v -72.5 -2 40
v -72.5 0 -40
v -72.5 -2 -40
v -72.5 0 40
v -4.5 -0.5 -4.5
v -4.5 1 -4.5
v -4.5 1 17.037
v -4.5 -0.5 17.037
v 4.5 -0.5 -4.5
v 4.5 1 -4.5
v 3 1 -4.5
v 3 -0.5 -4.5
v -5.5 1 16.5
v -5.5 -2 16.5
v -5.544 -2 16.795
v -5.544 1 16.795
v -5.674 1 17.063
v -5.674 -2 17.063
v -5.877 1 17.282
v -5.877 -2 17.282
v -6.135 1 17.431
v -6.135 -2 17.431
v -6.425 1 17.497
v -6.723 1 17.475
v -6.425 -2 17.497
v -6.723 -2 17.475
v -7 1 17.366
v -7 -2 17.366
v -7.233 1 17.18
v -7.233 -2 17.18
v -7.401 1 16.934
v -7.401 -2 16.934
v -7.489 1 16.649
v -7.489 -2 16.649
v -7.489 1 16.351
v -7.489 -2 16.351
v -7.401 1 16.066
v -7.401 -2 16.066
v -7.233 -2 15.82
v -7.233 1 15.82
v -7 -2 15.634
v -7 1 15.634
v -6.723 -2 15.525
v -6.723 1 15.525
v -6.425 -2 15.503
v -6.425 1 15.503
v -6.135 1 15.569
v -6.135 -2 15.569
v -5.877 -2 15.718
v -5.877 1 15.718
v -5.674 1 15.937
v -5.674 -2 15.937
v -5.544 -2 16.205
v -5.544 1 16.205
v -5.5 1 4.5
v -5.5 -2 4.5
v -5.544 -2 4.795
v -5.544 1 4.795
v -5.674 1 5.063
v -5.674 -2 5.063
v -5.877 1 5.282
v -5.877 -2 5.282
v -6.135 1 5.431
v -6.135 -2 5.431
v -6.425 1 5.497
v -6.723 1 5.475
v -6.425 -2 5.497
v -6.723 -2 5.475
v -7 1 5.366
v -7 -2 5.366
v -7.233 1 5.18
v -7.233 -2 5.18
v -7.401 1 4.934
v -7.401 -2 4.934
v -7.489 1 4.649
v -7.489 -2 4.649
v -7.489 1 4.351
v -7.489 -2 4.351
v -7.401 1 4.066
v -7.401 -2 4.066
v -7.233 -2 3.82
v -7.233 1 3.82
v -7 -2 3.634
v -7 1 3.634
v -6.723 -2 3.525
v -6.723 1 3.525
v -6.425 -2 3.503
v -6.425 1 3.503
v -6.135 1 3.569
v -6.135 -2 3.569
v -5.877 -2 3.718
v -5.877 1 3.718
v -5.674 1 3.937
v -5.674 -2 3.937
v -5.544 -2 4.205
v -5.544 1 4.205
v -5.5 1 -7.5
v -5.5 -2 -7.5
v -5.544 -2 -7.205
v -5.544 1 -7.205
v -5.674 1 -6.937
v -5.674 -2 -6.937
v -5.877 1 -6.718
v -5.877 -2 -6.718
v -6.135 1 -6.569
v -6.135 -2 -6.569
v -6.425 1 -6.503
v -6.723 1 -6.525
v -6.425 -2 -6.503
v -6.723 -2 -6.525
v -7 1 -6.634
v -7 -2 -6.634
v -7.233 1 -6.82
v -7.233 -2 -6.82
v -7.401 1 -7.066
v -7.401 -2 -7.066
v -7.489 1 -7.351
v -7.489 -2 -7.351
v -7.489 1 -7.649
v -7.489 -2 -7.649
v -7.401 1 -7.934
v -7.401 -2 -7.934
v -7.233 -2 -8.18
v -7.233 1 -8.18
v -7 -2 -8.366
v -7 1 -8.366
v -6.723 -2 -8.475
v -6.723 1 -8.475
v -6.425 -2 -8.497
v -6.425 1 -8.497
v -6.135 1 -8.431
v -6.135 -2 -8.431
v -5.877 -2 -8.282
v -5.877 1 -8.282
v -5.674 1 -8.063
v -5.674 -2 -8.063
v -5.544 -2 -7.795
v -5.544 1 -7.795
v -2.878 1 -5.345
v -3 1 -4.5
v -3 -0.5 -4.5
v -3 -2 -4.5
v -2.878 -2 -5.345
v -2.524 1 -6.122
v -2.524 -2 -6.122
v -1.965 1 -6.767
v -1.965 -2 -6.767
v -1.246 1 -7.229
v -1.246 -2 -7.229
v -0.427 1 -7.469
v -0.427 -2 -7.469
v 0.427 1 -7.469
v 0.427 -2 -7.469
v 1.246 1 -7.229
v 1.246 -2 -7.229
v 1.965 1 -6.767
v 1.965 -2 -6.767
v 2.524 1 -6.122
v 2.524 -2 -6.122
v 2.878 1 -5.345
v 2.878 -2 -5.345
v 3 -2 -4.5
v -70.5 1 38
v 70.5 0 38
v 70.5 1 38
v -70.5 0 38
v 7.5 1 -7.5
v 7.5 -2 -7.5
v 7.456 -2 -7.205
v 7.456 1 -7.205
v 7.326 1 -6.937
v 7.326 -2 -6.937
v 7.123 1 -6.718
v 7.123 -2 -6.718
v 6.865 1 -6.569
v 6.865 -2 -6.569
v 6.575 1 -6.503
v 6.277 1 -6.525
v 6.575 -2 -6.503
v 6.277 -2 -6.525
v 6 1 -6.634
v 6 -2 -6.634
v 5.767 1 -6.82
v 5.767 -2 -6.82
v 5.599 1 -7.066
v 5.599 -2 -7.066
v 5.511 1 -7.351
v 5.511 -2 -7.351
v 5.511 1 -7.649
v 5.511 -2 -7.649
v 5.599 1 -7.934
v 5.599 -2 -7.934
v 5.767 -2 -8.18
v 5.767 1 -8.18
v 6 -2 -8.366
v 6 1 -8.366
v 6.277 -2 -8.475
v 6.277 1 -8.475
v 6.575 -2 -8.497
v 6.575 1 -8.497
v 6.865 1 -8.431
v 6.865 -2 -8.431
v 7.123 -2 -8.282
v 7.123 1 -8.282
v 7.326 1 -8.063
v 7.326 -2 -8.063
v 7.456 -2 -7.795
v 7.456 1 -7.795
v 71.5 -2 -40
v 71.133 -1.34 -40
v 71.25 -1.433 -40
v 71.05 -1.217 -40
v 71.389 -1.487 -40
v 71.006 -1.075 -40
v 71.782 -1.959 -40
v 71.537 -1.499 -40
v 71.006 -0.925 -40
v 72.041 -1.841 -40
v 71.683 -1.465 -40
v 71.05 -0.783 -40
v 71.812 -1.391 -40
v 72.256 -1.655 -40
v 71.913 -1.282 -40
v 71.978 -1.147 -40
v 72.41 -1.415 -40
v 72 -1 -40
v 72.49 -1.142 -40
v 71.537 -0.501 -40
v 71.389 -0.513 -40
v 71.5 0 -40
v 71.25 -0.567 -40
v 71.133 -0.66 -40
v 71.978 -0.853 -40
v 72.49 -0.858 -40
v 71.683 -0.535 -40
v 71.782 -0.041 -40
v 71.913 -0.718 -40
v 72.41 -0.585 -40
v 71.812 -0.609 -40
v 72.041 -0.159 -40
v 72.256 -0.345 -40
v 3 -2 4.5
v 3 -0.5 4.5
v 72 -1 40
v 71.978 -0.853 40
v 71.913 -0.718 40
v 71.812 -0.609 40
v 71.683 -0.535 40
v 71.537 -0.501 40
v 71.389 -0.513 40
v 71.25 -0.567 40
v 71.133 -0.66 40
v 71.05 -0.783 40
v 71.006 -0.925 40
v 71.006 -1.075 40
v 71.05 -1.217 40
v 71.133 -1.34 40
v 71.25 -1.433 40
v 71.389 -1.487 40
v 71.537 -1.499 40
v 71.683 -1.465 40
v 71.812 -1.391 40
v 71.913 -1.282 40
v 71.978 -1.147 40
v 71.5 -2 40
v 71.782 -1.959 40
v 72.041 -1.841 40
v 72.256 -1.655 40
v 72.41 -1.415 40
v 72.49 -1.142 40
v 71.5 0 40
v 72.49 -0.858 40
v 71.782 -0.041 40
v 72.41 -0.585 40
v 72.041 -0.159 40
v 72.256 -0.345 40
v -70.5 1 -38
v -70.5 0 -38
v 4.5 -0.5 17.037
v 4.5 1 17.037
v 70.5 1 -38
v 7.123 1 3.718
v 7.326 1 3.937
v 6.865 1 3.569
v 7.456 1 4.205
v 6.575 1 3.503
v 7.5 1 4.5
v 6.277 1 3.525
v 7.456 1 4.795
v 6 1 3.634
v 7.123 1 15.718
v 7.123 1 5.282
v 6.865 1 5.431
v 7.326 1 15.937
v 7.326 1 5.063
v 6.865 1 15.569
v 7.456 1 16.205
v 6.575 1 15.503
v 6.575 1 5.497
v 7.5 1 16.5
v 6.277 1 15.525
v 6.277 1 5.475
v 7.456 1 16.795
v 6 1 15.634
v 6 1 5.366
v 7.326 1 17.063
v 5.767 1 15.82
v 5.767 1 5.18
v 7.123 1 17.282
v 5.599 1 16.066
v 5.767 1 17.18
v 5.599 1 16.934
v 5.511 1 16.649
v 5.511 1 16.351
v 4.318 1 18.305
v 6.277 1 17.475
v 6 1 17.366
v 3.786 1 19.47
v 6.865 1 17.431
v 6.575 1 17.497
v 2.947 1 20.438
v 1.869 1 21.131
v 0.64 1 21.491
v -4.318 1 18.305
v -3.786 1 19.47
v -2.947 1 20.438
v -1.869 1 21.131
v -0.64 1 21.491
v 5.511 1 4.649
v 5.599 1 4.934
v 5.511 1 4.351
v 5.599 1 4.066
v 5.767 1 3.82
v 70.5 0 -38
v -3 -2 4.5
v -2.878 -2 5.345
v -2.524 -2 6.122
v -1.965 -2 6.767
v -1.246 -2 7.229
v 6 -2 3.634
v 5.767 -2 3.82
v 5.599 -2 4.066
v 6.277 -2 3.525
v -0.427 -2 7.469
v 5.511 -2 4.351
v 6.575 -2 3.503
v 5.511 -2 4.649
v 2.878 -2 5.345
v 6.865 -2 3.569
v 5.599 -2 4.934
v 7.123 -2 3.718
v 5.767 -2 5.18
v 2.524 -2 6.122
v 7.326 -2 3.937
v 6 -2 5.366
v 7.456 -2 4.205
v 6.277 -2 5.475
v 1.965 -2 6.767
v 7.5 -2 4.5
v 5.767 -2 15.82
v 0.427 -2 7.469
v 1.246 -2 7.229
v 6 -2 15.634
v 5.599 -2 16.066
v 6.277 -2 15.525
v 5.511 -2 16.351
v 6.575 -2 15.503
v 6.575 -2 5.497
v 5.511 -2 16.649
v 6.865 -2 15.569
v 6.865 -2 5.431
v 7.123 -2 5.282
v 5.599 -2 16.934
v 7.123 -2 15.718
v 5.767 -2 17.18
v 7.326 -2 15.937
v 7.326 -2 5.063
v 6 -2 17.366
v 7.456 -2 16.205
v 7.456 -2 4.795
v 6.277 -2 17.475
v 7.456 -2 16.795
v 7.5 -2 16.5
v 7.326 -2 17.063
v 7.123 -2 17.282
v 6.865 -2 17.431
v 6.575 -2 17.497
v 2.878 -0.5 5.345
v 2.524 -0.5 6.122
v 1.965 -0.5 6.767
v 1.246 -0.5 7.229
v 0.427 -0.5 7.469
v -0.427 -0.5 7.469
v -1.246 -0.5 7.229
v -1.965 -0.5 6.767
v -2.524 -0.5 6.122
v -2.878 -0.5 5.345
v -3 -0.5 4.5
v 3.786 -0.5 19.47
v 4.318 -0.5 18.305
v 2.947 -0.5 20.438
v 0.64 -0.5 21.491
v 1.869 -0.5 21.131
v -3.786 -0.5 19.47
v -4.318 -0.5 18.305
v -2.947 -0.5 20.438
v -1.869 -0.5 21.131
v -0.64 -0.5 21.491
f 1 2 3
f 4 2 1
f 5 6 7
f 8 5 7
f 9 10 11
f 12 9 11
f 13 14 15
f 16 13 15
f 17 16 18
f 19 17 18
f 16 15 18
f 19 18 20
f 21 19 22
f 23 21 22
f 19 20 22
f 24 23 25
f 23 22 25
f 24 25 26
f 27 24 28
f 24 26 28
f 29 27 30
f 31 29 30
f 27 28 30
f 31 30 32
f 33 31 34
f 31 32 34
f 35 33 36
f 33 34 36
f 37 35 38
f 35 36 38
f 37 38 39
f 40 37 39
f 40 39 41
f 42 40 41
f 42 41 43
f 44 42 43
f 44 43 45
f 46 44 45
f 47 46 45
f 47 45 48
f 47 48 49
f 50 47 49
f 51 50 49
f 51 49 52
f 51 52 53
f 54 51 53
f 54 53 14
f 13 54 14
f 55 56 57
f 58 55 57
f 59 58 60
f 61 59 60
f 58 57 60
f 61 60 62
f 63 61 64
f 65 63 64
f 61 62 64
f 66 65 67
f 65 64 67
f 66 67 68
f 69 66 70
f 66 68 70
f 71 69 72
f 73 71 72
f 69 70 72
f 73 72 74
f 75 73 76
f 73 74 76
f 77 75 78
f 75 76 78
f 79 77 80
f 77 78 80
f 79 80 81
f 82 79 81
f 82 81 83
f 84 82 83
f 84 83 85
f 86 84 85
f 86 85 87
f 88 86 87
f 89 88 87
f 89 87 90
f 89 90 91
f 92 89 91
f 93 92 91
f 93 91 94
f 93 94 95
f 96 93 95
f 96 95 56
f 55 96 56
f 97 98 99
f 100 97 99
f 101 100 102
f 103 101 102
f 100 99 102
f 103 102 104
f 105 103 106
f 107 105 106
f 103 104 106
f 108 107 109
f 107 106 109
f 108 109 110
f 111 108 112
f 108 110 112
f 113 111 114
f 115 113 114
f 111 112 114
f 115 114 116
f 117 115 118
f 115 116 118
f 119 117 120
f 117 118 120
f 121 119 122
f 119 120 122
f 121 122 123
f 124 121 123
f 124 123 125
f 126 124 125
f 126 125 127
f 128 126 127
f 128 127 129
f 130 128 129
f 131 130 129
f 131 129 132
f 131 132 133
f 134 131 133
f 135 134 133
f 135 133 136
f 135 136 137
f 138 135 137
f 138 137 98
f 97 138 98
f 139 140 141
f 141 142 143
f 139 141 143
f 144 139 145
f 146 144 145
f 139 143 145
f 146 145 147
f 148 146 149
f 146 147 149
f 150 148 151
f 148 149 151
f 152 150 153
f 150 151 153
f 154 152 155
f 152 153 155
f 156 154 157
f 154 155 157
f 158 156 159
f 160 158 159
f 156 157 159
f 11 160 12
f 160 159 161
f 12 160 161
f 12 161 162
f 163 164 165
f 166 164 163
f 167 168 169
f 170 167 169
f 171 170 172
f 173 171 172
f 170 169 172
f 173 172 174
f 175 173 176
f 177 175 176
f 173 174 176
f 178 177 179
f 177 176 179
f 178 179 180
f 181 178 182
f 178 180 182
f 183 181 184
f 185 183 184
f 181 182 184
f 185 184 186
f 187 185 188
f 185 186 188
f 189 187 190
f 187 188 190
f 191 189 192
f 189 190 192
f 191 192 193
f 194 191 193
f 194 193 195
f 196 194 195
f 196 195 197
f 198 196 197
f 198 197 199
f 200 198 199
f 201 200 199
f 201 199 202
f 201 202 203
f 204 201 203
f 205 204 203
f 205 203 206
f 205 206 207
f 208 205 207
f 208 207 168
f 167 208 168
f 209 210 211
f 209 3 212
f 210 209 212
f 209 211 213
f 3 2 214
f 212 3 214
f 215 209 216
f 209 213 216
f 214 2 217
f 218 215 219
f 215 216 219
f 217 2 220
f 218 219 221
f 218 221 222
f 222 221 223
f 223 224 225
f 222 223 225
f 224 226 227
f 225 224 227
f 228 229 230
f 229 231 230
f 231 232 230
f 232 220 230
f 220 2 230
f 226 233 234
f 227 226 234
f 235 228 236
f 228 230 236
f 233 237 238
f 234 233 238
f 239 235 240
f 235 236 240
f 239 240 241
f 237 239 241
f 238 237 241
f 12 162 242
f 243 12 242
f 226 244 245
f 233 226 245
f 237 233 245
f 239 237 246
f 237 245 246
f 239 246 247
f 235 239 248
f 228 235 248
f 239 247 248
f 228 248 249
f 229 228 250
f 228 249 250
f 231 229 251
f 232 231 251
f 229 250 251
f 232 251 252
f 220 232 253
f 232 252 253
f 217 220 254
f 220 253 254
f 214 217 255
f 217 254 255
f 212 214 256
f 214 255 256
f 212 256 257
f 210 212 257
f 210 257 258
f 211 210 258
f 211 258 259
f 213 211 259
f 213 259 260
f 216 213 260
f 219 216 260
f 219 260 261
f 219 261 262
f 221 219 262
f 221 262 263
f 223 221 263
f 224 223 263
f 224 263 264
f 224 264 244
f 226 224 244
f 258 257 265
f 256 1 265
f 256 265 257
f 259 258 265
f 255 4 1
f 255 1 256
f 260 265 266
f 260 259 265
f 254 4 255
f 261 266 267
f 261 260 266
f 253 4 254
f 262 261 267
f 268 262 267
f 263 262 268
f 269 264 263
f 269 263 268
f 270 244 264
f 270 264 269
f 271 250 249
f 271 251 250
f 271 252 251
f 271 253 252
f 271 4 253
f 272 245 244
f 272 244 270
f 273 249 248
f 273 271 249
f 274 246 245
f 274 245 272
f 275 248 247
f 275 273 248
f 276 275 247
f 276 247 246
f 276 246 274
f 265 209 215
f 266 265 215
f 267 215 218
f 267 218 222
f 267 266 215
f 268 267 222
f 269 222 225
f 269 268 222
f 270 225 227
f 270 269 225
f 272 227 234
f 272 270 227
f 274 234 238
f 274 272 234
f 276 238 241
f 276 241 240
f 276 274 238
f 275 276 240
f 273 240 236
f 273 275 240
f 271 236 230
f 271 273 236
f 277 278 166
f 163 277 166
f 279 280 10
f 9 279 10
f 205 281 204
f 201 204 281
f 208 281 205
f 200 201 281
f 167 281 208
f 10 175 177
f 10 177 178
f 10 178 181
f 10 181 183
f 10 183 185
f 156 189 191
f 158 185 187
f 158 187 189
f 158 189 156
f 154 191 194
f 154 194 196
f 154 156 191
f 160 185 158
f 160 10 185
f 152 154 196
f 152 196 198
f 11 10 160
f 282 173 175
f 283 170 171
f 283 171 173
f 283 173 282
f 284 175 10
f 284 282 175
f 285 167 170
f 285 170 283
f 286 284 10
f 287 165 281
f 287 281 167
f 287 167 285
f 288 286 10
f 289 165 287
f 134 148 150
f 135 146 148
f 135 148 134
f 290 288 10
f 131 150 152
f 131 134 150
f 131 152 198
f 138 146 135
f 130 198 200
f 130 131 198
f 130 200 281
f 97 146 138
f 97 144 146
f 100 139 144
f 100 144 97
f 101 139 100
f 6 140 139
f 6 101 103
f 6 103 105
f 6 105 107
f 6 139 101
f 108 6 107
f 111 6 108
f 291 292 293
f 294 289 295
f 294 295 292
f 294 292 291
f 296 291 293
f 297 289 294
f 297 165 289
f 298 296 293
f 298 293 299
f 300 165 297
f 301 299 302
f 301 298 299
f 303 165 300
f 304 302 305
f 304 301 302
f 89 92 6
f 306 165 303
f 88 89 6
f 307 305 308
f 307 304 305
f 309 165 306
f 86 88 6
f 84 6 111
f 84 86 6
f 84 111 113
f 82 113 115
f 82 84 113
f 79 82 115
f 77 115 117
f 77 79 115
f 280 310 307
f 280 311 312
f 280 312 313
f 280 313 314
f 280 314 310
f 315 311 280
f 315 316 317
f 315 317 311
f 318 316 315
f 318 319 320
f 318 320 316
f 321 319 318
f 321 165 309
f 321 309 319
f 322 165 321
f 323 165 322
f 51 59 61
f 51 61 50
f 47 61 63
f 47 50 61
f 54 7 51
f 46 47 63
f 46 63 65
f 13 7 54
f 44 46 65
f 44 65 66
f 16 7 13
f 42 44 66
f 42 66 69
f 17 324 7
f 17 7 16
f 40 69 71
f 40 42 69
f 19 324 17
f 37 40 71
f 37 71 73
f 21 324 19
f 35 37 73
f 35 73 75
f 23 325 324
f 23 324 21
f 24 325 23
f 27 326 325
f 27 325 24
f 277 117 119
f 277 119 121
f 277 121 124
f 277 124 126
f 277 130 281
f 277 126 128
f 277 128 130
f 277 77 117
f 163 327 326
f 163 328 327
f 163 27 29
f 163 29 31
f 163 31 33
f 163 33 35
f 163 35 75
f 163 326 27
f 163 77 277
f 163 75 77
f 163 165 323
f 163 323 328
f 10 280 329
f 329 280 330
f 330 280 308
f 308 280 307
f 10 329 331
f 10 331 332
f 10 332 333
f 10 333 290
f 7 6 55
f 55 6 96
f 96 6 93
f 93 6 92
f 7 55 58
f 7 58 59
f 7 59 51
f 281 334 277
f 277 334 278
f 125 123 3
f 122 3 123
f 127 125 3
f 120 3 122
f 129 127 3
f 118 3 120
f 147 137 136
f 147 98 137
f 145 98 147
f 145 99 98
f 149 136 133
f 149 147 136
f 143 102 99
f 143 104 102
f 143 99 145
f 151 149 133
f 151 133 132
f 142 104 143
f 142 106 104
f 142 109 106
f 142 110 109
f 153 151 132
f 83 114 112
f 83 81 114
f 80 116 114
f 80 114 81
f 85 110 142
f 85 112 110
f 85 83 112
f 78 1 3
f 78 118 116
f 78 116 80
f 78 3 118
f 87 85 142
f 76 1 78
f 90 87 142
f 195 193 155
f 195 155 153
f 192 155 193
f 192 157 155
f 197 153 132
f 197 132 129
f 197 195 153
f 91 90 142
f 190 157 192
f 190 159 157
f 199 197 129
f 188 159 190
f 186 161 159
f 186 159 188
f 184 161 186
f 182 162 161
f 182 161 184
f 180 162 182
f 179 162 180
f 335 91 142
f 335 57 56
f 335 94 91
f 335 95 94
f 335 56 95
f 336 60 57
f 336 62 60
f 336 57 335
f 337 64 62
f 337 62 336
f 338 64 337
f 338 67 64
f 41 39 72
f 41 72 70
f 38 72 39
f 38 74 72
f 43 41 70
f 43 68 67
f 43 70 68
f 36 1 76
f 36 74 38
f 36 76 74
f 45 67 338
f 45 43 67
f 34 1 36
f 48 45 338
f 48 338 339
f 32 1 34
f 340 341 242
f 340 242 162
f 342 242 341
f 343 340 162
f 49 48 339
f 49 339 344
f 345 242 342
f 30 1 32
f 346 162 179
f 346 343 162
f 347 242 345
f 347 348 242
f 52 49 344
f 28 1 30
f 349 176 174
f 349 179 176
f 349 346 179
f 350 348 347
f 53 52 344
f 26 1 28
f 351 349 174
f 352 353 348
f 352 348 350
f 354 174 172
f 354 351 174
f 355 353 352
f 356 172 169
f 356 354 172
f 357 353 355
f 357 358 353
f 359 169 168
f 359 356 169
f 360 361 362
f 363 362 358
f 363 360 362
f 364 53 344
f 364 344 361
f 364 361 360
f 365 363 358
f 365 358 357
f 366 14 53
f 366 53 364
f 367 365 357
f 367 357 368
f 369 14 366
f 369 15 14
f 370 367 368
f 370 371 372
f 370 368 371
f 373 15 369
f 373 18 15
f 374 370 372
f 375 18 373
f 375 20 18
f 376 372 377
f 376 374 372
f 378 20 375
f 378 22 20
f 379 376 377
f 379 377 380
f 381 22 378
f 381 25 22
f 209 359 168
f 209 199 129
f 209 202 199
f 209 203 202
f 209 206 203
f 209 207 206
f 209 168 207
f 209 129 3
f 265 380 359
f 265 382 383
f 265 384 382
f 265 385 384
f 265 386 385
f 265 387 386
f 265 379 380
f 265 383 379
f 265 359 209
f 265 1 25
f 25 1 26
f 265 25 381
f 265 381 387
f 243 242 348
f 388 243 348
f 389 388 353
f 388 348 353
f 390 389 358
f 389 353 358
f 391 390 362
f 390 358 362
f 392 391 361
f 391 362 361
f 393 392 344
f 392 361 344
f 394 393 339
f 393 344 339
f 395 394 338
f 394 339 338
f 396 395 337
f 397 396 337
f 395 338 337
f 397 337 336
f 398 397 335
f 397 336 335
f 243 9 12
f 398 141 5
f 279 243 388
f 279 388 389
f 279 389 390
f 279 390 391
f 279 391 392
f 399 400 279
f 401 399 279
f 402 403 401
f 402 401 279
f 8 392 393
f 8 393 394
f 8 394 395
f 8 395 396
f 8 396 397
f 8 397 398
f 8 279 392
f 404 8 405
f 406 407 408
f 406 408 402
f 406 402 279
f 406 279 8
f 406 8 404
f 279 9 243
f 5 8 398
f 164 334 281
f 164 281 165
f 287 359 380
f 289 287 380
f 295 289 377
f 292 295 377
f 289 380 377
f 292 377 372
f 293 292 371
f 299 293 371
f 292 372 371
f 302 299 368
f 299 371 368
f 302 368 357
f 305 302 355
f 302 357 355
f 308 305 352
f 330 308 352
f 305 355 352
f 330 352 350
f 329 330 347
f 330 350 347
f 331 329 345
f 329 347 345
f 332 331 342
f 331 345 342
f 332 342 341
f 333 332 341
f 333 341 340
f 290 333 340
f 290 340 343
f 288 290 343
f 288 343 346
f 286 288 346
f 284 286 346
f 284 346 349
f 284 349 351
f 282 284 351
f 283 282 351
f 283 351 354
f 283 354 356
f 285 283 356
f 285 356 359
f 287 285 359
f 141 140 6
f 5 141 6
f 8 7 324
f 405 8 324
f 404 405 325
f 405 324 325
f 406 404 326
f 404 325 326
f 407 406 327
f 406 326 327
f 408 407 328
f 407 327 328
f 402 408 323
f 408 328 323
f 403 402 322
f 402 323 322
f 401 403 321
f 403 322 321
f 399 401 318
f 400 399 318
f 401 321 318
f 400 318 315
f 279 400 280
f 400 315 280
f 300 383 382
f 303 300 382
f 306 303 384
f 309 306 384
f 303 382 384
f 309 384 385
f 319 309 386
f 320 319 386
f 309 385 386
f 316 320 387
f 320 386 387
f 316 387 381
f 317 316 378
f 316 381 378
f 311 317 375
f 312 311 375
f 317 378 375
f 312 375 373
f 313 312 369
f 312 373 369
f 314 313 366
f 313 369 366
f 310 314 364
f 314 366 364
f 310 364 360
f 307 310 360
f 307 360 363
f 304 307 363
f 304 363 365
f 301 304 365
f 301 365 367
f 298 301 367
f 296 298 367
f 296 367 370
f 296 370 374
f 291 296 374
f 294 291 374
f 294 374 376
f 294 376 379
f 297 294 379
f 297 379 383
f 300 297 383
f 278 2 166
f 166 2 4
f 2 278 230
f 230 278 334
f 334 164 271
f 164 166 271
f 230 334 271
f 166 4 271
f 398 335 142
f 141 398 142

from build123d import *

# Parameters (mm, degrees)
F0_W      = 145
F0_H      = 80
F1_DEPTH  = 2
F2_W      = 141
F2_H      = 76
F3_DEPTH  = 1
F5_DEPTH  = 25
F6_R      = 1
F7_DEPTH  = 25
F8_W      = 1
F8_H      = 2
F9_DEPTH  = 200
F10_R     = 1
F11_DEPTH = 80
F12_R     = 0.5
F13_DEPTH = 300
F15_DEPTH = 1.5


with BuildPart() as f1:
    # F0 (on Front) → F1 (new body)
    with BuildSketch(Plane.XZ):
        Rectangle(F0_W, F0_H)
    extrude(amount=F1_DEPTH)

    # F2 (on face) → F3 (join)
    with BuildSketch(Plane(origin=(0, 0, 0), x_dir=(-1, 0, 0), z_dir=(0, 1, 0))):
        Rectangle(F2_W, F2_H)
    extrude(amount=F3_DEPTH)

    # F4 (on face) → F5 (cut)
    with BuildSketch(Plane.XZ.offset(2)):
        with BuildLine():
            Line((3, -4.5), (3, 4.5))
            ThreePointArc((3, 4.5), (0, 7.5), (-3, 4.5))
            Line((-3, 4.5), (-3, -4.5))
            ThreePointArc((-3, -4.5), (0, -7.5), (3, -4.5))
        make_face()
    extrude(amount=-F5_DEPTH, mode=Mode.SUBTRACT)

    # F6 (on face) → F7 (cut)
    with BuildSketch(Plane.XZ.offset(2)):
        with Locations((-6.5, 16.5)):
            Circle(F6_R)
        with Locations((6.5, 16.5)):
            Circle(F6_R)
        with Locations((6.5, -7.5)):
            Circle(F6_R)
        with Locations((-6.5, -7.5)):
            Circle(F6_R)
        with Locations((-6.5, 4.5)):
            Circle(F6_R)
        with Locations((6.5, 4.5)):
            Circle(F6_R)
    extrude(amount=-F7_DEPTH, mode=Mode.SUBTRACT)

    # F8 (on face) → F9 (cut)
    with BuildSketch(Plane.XY.offset(40)):
        with Locations((72, -1)):
            Rectangle(F8_W, F8_H)
    extrude(amount=-F9_DEPTH, mode=Mode.SUBTRACT)

    # F10 (on face) → F11 (join)
    with BuildSketch(Plane.XY.offset(40)):
        with Locations((71.5, -1)):
            Circle(F10_R)
    extrude(amount=-F11_DEPTH)

    # F12 (on face) → F13 (cut)
    with BuildSketch(Plane.XY.offset(40)):
        with Locations((71.5, -1)):
            Circle(F12_R)
    extrude(amount=-F13_DEPTH, mode=Mode.SUBTRACT)

    # F14 (on face) → F15 (cut)
    with BuildSketch(Plane(origin=(0, 1, 0), x_dir=(-1, 0, 0), z_dir=(0, 1, 0))):
        with BuildLine():
            Line((-4.5, -4.5), (-3, -4.5))
            Line((-3, -4.5), (3, -4.5))
            Line((3, -4.5), (4.5, -4.5))
            Line((4.5, -4.5), (4.5, 17.037205))
            ThreePointArc((4.5, 17.037205), (0, 21.537205), (-4.5, 17.037205))
            Line((-4.5, 17.037205), (-4.5, -4.5))
        make_face()
    extrude(amount=-F15_DEPTH, mode=Mode.SUBTRACT)


solid = f1.part
